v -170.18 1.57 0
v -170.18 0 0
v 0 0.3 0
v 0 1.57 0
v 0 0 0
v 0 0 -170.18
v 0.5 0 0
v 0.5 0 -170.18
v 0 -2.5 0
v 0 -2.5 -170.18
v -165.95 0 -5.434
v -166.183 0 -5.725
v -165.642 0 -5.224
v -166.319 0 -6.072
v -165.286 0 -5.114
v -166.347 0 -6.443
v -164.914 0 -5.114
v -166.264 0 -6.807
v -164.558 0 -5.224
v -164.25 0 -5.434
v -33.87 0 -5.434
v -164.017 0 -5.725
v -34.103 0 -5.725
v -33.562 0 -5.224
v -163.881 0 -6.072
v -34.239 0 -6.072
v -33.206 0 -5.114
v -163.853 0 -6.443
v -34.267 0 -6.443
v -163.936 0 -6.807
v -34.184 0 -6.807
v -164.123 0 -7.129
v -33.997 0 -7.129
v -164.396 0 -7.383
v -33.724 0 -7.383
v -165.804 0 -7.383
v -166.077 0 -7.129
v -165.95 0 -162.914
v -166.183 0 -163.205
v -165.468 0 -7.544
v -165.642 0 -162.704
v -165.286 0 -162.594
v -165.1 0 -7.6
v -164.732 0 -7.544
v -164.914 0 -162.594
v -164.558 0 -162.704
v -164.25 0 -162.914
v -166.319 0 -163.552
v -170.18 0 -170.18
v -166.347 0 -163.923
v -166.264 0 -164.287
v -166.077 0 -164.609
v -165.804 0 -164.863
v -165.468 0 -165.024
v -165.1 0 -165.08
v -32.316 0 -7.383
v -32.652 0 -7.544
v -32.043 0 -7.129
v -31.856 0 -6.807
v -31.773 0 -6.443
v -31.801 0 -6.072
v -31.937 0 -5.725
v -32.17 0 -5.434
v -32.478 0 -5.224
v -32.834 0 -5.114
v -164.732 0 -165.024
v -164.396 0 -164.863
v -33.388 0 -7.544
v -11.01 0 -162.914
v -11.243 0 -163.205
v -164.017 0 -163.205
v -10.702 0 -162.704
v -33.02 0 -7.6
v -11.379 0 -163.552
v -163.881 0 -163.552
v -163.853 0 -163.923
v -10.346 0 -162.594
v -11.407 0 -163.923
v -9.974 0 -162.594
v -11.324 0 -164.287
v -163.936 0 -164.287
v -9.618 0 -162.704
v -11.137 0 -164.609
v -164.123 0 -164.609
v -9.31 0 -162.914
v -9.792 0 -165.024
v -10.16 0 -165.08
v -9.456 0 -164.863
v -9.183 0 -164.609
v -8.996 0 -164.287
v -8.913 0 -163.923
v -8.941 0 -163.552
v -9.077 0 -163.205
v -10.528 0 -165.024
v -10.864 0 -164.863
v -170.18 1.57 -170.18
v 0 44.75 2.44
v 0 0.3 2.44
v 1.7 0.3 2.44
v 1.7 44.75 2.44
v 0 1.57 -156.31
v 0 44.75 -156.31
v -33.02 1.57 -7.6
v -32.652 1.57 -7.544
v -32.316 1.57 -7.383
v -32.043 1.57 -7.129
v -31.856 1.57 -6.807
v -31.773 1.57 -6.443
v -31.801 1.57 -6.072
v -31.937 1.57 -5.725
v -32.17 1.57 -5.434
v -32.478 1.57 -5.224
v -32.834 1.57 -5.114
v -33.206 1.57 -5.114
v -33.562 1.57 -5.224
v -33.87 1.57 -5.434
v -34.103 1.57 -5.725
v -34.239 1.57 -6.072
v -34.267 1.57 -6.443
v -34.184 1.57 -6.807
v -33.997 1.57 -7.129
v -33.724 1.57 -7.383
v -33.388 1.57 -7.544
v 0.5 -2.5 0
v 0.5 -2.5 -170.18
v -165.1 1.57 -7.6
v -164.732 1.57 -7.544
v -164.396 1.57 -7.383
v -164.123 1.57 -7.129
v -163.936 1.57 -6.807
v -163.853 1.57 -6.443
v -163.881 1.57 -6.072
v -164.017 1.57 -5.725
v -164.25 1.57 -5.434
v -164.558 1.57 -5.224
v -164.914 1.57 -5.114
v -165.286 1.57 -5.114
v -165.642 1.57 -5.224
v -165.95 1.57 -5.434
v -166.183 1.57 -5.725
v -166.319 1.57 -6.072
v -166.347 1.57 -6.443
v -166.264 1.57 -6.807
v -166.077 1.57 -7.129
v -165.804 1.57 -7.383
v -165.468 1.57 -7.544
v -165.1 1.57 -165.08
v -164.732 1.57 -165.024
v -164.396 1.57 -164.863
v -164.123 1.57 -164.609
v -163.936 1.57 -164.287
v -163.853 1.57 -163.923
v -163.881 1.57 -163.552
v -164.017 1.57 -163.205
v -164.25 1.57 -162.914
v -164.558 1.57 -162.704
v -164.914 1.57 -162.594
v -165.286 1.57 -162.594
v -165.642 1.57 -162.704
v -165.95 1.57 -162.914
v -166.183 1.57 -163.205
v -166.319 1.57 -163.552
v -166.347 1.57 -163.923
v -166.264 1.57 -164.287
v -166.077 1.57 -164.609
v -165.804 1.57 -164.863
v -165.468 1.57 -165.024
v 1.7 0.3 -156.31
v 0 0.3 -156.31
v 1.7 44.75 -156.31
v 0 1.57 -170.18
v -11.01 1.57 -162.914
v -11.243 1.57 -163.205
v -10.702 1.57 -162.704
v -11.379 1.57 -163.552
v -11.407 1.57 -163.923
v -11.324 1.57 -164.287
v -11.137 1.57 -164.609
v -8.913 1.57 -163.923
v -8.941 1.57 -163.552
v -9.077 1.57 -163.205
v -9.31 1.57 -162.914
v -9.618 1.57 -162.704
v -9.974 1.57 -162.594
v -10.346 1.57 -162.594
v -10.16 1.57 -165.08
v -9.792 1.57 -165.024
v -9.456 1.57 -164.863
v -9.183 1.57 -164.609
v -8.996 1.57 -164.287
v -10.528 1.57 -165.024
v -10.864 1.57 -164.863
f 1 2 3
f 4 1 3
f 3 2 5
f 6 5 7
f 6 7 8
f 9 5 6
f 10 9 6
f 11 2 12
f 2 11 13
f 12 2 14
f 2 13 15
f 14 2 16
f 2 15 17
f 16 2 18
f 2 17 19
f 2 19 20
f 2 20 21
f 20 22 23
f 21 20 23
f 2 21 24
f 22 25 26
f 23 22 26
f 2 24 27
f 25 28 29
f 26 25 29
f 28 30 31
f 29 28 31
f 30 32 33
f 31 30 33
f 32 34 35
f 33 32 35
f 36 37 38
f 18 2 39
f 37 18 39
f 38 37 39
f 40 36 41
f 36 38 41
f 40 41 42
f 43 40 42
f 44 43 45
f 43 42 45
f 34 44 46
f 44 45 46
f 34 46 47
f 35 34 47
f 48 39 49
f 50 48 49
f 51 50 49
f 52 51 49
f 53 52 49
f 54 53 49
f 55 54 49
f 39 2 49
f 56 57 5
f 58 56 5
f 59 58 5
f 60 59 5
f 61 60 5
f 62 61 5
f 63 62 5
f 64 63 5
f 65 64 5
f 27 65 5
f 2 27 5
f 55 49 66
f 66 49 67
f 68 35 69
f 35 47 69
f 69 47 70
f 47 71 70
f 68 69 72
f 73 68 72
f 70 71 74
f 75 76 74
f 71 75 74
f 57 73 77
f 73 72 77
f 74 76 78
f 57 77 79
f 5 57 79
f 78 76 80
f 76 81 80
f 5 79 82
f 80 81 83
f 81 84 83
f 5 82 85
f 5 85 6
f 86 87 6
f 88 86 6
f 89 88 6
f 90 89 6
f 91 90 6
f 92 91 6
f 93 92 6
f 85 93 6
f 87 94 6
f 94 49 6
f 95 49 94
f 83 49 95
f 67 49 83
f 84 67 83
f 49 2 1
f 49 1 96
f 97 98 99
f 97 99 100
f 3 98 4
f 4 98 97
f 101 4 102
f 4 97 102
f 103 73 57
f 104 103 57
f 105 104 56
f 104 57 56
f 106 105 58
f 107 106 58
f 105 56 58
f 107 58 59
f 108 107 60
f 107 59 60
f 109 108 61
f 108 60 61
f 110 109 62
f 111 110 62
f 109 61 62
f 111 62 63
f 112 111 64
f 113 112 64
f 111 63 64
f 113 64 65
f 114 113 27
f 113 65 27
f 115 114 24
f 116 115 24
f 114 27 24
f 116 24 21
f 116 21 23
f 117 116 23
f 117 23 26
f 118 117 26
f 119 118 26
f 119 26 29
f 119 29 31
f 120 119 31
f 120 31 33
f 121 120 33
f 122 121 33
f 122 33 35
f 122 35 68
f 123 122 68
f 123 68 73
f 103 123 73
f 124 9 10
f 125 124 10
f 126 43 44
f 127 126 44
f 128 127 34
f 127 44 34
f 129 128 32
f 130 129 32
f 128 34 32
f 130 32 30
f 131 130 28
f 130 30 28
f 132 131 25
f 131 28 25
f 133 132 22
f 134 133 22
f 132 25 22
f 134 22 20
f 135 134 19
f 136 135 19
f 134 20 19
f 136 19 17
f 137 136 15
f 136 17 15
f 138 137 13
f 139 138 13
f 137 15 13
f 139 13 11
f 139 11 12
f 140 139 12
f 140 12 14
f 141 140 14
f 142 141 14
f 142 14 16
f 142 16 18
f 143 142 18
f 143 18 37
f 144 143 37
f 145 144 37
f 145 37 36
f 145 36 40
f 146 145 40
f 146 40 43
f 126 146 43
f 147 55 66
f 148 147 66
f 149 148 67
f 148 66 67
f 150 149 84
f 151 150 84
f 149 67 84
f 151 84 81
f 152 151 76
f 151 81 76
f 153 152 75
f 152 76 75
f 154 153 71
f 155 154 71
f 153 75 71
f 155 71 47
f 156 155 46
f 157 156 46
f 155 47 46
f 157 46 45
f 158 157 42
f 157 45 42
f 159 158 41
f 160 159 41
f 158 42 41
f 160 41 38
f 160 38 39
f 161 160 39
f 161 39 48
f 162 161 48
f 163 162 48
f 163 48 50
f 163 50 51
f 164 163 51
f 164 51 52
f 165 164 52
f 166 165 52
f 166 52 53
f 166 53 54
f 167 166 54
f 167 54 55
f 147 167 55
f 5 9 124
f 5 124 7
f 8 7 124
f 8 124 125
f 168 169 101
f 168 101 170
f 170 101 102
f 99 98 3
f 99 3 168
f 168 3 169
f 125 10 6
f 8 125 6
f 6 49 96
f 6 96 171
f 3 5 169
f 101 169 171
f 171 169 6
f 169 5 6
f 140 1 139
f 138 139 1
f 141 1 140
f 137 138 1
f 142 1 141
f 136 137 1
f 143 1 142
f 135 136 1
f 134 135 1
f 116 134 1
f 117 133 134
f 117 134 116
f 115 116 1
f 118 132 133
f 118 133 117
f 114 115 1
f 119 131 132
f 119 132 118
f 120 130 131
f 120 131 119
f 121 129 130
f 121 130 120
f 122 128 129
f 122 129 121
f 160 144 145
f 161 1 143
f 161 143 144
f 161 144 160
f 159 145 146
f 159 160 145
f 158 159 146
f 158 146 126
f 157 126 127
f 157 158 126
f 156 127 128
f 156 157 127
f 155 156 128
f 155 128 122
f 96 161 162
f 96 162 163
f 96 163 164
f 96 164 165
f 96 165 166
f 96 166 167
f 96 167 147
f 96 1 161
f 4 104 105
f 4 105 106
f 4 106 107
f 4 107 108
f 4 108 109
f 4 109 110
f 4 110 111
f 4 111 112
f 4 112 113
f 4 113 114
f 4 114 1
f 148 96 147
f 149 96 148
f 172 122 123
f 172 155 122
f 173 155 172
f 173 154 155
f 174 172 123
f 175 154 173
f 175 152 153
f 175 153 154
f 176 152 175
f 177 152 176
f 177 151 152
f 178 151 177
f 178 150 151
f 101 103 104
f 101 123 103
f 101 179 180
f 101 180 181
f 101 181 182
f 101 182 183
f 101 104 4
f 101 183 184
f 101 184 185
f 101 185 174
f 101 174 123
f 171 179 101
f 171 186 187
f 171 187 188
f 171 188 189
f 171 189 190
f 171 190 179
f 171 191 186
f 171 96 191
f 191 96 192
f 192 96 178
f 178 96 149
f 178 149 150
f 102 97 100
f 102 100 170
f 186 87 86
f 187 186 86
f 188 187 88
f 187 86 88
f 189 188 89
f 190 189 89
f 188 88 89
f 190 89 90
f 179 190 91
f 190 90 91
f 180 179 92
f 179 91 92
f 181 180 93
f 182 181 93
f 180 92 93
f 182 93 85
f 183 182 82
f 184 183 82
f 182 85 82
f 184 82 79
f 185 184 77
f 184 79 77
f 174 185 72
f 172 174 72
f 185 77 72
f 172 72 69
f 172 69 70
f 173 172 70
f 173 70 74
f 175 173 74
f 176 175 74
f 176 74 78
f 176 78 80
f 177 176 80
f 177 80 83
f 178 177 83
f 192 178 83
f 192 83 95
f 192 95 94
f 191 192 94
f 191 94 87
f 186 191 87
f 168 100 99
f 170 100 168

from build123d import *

# Parameters (mm, degrees)
SKETCH1_W              = 170.18
SKETCH1_H              = 170.18
PCB_DEPTH              = 1.57
M3X0_5_TAPPED_HOLE1_D  = 2.5
SKETCH5_W              = 158.75
SKETCH5_H              = 44.45
IO_SHIELD_DEPTH        = 1.7
SKETCH6_W              = 170.18
SKETCH6_H              = 2.5
IO_SHIELD_FLANGE_DEPTH = 0.5


with BuildPart() as part:
    # Sketch1 → pcb (new body)
    with BuildSketch(Plane(origin=(0, 0, 0), x_dir=(1, 0, 0), z_dir=(0, 1, 0))):
        with Locations((-85.09, 85.09)):
            Rectangle(SKETCH1_W, SKETCH1_H)
    extrude(amount=PCB_DEPTH)

    # M3x0.5 Tapped Hole1 (through all)
    with Locations(Plane(origin=(-165.1, 1.57, -163.83), x_dir=(0, 0, 1), z_dir=(0, 1, 0))):
        with Locations((0, 0), (0, 154.94), (157.48, 132.08), (157.48, 0)):
            Hole(M3X0_5_TAPPED_HOLE1_D / 2)

    # Sketch5 → io-shield (add)
    with BuildSketch(Plane(origin=(0, 0, 0), x_dir=(0, 0, -1), z_dir=(1, 0, 0))):
        with Locations((76.935, 22.525)):
            Rectangle(SKETCH5_W, SKETCH5_H)
    extrude(amount=IO_SHIELD_DEPTH)


with BuildPart() as body_2:
    # Sketch6 → io-shield-flange (new body)
    with BuildSketch(Plane(origin=(0, 0, 0), x_dir=(0, 0, -1), z_dir=(1, 0, 0))):
        with Locations((85.09, -1.25)):
            Rectangle(SKETCH6_W, SKETCH6_H)
    extrude(amount=IO_SHIELD_FLANGE_DEPTH)


solid = Compound([part.part, body_2.part])
